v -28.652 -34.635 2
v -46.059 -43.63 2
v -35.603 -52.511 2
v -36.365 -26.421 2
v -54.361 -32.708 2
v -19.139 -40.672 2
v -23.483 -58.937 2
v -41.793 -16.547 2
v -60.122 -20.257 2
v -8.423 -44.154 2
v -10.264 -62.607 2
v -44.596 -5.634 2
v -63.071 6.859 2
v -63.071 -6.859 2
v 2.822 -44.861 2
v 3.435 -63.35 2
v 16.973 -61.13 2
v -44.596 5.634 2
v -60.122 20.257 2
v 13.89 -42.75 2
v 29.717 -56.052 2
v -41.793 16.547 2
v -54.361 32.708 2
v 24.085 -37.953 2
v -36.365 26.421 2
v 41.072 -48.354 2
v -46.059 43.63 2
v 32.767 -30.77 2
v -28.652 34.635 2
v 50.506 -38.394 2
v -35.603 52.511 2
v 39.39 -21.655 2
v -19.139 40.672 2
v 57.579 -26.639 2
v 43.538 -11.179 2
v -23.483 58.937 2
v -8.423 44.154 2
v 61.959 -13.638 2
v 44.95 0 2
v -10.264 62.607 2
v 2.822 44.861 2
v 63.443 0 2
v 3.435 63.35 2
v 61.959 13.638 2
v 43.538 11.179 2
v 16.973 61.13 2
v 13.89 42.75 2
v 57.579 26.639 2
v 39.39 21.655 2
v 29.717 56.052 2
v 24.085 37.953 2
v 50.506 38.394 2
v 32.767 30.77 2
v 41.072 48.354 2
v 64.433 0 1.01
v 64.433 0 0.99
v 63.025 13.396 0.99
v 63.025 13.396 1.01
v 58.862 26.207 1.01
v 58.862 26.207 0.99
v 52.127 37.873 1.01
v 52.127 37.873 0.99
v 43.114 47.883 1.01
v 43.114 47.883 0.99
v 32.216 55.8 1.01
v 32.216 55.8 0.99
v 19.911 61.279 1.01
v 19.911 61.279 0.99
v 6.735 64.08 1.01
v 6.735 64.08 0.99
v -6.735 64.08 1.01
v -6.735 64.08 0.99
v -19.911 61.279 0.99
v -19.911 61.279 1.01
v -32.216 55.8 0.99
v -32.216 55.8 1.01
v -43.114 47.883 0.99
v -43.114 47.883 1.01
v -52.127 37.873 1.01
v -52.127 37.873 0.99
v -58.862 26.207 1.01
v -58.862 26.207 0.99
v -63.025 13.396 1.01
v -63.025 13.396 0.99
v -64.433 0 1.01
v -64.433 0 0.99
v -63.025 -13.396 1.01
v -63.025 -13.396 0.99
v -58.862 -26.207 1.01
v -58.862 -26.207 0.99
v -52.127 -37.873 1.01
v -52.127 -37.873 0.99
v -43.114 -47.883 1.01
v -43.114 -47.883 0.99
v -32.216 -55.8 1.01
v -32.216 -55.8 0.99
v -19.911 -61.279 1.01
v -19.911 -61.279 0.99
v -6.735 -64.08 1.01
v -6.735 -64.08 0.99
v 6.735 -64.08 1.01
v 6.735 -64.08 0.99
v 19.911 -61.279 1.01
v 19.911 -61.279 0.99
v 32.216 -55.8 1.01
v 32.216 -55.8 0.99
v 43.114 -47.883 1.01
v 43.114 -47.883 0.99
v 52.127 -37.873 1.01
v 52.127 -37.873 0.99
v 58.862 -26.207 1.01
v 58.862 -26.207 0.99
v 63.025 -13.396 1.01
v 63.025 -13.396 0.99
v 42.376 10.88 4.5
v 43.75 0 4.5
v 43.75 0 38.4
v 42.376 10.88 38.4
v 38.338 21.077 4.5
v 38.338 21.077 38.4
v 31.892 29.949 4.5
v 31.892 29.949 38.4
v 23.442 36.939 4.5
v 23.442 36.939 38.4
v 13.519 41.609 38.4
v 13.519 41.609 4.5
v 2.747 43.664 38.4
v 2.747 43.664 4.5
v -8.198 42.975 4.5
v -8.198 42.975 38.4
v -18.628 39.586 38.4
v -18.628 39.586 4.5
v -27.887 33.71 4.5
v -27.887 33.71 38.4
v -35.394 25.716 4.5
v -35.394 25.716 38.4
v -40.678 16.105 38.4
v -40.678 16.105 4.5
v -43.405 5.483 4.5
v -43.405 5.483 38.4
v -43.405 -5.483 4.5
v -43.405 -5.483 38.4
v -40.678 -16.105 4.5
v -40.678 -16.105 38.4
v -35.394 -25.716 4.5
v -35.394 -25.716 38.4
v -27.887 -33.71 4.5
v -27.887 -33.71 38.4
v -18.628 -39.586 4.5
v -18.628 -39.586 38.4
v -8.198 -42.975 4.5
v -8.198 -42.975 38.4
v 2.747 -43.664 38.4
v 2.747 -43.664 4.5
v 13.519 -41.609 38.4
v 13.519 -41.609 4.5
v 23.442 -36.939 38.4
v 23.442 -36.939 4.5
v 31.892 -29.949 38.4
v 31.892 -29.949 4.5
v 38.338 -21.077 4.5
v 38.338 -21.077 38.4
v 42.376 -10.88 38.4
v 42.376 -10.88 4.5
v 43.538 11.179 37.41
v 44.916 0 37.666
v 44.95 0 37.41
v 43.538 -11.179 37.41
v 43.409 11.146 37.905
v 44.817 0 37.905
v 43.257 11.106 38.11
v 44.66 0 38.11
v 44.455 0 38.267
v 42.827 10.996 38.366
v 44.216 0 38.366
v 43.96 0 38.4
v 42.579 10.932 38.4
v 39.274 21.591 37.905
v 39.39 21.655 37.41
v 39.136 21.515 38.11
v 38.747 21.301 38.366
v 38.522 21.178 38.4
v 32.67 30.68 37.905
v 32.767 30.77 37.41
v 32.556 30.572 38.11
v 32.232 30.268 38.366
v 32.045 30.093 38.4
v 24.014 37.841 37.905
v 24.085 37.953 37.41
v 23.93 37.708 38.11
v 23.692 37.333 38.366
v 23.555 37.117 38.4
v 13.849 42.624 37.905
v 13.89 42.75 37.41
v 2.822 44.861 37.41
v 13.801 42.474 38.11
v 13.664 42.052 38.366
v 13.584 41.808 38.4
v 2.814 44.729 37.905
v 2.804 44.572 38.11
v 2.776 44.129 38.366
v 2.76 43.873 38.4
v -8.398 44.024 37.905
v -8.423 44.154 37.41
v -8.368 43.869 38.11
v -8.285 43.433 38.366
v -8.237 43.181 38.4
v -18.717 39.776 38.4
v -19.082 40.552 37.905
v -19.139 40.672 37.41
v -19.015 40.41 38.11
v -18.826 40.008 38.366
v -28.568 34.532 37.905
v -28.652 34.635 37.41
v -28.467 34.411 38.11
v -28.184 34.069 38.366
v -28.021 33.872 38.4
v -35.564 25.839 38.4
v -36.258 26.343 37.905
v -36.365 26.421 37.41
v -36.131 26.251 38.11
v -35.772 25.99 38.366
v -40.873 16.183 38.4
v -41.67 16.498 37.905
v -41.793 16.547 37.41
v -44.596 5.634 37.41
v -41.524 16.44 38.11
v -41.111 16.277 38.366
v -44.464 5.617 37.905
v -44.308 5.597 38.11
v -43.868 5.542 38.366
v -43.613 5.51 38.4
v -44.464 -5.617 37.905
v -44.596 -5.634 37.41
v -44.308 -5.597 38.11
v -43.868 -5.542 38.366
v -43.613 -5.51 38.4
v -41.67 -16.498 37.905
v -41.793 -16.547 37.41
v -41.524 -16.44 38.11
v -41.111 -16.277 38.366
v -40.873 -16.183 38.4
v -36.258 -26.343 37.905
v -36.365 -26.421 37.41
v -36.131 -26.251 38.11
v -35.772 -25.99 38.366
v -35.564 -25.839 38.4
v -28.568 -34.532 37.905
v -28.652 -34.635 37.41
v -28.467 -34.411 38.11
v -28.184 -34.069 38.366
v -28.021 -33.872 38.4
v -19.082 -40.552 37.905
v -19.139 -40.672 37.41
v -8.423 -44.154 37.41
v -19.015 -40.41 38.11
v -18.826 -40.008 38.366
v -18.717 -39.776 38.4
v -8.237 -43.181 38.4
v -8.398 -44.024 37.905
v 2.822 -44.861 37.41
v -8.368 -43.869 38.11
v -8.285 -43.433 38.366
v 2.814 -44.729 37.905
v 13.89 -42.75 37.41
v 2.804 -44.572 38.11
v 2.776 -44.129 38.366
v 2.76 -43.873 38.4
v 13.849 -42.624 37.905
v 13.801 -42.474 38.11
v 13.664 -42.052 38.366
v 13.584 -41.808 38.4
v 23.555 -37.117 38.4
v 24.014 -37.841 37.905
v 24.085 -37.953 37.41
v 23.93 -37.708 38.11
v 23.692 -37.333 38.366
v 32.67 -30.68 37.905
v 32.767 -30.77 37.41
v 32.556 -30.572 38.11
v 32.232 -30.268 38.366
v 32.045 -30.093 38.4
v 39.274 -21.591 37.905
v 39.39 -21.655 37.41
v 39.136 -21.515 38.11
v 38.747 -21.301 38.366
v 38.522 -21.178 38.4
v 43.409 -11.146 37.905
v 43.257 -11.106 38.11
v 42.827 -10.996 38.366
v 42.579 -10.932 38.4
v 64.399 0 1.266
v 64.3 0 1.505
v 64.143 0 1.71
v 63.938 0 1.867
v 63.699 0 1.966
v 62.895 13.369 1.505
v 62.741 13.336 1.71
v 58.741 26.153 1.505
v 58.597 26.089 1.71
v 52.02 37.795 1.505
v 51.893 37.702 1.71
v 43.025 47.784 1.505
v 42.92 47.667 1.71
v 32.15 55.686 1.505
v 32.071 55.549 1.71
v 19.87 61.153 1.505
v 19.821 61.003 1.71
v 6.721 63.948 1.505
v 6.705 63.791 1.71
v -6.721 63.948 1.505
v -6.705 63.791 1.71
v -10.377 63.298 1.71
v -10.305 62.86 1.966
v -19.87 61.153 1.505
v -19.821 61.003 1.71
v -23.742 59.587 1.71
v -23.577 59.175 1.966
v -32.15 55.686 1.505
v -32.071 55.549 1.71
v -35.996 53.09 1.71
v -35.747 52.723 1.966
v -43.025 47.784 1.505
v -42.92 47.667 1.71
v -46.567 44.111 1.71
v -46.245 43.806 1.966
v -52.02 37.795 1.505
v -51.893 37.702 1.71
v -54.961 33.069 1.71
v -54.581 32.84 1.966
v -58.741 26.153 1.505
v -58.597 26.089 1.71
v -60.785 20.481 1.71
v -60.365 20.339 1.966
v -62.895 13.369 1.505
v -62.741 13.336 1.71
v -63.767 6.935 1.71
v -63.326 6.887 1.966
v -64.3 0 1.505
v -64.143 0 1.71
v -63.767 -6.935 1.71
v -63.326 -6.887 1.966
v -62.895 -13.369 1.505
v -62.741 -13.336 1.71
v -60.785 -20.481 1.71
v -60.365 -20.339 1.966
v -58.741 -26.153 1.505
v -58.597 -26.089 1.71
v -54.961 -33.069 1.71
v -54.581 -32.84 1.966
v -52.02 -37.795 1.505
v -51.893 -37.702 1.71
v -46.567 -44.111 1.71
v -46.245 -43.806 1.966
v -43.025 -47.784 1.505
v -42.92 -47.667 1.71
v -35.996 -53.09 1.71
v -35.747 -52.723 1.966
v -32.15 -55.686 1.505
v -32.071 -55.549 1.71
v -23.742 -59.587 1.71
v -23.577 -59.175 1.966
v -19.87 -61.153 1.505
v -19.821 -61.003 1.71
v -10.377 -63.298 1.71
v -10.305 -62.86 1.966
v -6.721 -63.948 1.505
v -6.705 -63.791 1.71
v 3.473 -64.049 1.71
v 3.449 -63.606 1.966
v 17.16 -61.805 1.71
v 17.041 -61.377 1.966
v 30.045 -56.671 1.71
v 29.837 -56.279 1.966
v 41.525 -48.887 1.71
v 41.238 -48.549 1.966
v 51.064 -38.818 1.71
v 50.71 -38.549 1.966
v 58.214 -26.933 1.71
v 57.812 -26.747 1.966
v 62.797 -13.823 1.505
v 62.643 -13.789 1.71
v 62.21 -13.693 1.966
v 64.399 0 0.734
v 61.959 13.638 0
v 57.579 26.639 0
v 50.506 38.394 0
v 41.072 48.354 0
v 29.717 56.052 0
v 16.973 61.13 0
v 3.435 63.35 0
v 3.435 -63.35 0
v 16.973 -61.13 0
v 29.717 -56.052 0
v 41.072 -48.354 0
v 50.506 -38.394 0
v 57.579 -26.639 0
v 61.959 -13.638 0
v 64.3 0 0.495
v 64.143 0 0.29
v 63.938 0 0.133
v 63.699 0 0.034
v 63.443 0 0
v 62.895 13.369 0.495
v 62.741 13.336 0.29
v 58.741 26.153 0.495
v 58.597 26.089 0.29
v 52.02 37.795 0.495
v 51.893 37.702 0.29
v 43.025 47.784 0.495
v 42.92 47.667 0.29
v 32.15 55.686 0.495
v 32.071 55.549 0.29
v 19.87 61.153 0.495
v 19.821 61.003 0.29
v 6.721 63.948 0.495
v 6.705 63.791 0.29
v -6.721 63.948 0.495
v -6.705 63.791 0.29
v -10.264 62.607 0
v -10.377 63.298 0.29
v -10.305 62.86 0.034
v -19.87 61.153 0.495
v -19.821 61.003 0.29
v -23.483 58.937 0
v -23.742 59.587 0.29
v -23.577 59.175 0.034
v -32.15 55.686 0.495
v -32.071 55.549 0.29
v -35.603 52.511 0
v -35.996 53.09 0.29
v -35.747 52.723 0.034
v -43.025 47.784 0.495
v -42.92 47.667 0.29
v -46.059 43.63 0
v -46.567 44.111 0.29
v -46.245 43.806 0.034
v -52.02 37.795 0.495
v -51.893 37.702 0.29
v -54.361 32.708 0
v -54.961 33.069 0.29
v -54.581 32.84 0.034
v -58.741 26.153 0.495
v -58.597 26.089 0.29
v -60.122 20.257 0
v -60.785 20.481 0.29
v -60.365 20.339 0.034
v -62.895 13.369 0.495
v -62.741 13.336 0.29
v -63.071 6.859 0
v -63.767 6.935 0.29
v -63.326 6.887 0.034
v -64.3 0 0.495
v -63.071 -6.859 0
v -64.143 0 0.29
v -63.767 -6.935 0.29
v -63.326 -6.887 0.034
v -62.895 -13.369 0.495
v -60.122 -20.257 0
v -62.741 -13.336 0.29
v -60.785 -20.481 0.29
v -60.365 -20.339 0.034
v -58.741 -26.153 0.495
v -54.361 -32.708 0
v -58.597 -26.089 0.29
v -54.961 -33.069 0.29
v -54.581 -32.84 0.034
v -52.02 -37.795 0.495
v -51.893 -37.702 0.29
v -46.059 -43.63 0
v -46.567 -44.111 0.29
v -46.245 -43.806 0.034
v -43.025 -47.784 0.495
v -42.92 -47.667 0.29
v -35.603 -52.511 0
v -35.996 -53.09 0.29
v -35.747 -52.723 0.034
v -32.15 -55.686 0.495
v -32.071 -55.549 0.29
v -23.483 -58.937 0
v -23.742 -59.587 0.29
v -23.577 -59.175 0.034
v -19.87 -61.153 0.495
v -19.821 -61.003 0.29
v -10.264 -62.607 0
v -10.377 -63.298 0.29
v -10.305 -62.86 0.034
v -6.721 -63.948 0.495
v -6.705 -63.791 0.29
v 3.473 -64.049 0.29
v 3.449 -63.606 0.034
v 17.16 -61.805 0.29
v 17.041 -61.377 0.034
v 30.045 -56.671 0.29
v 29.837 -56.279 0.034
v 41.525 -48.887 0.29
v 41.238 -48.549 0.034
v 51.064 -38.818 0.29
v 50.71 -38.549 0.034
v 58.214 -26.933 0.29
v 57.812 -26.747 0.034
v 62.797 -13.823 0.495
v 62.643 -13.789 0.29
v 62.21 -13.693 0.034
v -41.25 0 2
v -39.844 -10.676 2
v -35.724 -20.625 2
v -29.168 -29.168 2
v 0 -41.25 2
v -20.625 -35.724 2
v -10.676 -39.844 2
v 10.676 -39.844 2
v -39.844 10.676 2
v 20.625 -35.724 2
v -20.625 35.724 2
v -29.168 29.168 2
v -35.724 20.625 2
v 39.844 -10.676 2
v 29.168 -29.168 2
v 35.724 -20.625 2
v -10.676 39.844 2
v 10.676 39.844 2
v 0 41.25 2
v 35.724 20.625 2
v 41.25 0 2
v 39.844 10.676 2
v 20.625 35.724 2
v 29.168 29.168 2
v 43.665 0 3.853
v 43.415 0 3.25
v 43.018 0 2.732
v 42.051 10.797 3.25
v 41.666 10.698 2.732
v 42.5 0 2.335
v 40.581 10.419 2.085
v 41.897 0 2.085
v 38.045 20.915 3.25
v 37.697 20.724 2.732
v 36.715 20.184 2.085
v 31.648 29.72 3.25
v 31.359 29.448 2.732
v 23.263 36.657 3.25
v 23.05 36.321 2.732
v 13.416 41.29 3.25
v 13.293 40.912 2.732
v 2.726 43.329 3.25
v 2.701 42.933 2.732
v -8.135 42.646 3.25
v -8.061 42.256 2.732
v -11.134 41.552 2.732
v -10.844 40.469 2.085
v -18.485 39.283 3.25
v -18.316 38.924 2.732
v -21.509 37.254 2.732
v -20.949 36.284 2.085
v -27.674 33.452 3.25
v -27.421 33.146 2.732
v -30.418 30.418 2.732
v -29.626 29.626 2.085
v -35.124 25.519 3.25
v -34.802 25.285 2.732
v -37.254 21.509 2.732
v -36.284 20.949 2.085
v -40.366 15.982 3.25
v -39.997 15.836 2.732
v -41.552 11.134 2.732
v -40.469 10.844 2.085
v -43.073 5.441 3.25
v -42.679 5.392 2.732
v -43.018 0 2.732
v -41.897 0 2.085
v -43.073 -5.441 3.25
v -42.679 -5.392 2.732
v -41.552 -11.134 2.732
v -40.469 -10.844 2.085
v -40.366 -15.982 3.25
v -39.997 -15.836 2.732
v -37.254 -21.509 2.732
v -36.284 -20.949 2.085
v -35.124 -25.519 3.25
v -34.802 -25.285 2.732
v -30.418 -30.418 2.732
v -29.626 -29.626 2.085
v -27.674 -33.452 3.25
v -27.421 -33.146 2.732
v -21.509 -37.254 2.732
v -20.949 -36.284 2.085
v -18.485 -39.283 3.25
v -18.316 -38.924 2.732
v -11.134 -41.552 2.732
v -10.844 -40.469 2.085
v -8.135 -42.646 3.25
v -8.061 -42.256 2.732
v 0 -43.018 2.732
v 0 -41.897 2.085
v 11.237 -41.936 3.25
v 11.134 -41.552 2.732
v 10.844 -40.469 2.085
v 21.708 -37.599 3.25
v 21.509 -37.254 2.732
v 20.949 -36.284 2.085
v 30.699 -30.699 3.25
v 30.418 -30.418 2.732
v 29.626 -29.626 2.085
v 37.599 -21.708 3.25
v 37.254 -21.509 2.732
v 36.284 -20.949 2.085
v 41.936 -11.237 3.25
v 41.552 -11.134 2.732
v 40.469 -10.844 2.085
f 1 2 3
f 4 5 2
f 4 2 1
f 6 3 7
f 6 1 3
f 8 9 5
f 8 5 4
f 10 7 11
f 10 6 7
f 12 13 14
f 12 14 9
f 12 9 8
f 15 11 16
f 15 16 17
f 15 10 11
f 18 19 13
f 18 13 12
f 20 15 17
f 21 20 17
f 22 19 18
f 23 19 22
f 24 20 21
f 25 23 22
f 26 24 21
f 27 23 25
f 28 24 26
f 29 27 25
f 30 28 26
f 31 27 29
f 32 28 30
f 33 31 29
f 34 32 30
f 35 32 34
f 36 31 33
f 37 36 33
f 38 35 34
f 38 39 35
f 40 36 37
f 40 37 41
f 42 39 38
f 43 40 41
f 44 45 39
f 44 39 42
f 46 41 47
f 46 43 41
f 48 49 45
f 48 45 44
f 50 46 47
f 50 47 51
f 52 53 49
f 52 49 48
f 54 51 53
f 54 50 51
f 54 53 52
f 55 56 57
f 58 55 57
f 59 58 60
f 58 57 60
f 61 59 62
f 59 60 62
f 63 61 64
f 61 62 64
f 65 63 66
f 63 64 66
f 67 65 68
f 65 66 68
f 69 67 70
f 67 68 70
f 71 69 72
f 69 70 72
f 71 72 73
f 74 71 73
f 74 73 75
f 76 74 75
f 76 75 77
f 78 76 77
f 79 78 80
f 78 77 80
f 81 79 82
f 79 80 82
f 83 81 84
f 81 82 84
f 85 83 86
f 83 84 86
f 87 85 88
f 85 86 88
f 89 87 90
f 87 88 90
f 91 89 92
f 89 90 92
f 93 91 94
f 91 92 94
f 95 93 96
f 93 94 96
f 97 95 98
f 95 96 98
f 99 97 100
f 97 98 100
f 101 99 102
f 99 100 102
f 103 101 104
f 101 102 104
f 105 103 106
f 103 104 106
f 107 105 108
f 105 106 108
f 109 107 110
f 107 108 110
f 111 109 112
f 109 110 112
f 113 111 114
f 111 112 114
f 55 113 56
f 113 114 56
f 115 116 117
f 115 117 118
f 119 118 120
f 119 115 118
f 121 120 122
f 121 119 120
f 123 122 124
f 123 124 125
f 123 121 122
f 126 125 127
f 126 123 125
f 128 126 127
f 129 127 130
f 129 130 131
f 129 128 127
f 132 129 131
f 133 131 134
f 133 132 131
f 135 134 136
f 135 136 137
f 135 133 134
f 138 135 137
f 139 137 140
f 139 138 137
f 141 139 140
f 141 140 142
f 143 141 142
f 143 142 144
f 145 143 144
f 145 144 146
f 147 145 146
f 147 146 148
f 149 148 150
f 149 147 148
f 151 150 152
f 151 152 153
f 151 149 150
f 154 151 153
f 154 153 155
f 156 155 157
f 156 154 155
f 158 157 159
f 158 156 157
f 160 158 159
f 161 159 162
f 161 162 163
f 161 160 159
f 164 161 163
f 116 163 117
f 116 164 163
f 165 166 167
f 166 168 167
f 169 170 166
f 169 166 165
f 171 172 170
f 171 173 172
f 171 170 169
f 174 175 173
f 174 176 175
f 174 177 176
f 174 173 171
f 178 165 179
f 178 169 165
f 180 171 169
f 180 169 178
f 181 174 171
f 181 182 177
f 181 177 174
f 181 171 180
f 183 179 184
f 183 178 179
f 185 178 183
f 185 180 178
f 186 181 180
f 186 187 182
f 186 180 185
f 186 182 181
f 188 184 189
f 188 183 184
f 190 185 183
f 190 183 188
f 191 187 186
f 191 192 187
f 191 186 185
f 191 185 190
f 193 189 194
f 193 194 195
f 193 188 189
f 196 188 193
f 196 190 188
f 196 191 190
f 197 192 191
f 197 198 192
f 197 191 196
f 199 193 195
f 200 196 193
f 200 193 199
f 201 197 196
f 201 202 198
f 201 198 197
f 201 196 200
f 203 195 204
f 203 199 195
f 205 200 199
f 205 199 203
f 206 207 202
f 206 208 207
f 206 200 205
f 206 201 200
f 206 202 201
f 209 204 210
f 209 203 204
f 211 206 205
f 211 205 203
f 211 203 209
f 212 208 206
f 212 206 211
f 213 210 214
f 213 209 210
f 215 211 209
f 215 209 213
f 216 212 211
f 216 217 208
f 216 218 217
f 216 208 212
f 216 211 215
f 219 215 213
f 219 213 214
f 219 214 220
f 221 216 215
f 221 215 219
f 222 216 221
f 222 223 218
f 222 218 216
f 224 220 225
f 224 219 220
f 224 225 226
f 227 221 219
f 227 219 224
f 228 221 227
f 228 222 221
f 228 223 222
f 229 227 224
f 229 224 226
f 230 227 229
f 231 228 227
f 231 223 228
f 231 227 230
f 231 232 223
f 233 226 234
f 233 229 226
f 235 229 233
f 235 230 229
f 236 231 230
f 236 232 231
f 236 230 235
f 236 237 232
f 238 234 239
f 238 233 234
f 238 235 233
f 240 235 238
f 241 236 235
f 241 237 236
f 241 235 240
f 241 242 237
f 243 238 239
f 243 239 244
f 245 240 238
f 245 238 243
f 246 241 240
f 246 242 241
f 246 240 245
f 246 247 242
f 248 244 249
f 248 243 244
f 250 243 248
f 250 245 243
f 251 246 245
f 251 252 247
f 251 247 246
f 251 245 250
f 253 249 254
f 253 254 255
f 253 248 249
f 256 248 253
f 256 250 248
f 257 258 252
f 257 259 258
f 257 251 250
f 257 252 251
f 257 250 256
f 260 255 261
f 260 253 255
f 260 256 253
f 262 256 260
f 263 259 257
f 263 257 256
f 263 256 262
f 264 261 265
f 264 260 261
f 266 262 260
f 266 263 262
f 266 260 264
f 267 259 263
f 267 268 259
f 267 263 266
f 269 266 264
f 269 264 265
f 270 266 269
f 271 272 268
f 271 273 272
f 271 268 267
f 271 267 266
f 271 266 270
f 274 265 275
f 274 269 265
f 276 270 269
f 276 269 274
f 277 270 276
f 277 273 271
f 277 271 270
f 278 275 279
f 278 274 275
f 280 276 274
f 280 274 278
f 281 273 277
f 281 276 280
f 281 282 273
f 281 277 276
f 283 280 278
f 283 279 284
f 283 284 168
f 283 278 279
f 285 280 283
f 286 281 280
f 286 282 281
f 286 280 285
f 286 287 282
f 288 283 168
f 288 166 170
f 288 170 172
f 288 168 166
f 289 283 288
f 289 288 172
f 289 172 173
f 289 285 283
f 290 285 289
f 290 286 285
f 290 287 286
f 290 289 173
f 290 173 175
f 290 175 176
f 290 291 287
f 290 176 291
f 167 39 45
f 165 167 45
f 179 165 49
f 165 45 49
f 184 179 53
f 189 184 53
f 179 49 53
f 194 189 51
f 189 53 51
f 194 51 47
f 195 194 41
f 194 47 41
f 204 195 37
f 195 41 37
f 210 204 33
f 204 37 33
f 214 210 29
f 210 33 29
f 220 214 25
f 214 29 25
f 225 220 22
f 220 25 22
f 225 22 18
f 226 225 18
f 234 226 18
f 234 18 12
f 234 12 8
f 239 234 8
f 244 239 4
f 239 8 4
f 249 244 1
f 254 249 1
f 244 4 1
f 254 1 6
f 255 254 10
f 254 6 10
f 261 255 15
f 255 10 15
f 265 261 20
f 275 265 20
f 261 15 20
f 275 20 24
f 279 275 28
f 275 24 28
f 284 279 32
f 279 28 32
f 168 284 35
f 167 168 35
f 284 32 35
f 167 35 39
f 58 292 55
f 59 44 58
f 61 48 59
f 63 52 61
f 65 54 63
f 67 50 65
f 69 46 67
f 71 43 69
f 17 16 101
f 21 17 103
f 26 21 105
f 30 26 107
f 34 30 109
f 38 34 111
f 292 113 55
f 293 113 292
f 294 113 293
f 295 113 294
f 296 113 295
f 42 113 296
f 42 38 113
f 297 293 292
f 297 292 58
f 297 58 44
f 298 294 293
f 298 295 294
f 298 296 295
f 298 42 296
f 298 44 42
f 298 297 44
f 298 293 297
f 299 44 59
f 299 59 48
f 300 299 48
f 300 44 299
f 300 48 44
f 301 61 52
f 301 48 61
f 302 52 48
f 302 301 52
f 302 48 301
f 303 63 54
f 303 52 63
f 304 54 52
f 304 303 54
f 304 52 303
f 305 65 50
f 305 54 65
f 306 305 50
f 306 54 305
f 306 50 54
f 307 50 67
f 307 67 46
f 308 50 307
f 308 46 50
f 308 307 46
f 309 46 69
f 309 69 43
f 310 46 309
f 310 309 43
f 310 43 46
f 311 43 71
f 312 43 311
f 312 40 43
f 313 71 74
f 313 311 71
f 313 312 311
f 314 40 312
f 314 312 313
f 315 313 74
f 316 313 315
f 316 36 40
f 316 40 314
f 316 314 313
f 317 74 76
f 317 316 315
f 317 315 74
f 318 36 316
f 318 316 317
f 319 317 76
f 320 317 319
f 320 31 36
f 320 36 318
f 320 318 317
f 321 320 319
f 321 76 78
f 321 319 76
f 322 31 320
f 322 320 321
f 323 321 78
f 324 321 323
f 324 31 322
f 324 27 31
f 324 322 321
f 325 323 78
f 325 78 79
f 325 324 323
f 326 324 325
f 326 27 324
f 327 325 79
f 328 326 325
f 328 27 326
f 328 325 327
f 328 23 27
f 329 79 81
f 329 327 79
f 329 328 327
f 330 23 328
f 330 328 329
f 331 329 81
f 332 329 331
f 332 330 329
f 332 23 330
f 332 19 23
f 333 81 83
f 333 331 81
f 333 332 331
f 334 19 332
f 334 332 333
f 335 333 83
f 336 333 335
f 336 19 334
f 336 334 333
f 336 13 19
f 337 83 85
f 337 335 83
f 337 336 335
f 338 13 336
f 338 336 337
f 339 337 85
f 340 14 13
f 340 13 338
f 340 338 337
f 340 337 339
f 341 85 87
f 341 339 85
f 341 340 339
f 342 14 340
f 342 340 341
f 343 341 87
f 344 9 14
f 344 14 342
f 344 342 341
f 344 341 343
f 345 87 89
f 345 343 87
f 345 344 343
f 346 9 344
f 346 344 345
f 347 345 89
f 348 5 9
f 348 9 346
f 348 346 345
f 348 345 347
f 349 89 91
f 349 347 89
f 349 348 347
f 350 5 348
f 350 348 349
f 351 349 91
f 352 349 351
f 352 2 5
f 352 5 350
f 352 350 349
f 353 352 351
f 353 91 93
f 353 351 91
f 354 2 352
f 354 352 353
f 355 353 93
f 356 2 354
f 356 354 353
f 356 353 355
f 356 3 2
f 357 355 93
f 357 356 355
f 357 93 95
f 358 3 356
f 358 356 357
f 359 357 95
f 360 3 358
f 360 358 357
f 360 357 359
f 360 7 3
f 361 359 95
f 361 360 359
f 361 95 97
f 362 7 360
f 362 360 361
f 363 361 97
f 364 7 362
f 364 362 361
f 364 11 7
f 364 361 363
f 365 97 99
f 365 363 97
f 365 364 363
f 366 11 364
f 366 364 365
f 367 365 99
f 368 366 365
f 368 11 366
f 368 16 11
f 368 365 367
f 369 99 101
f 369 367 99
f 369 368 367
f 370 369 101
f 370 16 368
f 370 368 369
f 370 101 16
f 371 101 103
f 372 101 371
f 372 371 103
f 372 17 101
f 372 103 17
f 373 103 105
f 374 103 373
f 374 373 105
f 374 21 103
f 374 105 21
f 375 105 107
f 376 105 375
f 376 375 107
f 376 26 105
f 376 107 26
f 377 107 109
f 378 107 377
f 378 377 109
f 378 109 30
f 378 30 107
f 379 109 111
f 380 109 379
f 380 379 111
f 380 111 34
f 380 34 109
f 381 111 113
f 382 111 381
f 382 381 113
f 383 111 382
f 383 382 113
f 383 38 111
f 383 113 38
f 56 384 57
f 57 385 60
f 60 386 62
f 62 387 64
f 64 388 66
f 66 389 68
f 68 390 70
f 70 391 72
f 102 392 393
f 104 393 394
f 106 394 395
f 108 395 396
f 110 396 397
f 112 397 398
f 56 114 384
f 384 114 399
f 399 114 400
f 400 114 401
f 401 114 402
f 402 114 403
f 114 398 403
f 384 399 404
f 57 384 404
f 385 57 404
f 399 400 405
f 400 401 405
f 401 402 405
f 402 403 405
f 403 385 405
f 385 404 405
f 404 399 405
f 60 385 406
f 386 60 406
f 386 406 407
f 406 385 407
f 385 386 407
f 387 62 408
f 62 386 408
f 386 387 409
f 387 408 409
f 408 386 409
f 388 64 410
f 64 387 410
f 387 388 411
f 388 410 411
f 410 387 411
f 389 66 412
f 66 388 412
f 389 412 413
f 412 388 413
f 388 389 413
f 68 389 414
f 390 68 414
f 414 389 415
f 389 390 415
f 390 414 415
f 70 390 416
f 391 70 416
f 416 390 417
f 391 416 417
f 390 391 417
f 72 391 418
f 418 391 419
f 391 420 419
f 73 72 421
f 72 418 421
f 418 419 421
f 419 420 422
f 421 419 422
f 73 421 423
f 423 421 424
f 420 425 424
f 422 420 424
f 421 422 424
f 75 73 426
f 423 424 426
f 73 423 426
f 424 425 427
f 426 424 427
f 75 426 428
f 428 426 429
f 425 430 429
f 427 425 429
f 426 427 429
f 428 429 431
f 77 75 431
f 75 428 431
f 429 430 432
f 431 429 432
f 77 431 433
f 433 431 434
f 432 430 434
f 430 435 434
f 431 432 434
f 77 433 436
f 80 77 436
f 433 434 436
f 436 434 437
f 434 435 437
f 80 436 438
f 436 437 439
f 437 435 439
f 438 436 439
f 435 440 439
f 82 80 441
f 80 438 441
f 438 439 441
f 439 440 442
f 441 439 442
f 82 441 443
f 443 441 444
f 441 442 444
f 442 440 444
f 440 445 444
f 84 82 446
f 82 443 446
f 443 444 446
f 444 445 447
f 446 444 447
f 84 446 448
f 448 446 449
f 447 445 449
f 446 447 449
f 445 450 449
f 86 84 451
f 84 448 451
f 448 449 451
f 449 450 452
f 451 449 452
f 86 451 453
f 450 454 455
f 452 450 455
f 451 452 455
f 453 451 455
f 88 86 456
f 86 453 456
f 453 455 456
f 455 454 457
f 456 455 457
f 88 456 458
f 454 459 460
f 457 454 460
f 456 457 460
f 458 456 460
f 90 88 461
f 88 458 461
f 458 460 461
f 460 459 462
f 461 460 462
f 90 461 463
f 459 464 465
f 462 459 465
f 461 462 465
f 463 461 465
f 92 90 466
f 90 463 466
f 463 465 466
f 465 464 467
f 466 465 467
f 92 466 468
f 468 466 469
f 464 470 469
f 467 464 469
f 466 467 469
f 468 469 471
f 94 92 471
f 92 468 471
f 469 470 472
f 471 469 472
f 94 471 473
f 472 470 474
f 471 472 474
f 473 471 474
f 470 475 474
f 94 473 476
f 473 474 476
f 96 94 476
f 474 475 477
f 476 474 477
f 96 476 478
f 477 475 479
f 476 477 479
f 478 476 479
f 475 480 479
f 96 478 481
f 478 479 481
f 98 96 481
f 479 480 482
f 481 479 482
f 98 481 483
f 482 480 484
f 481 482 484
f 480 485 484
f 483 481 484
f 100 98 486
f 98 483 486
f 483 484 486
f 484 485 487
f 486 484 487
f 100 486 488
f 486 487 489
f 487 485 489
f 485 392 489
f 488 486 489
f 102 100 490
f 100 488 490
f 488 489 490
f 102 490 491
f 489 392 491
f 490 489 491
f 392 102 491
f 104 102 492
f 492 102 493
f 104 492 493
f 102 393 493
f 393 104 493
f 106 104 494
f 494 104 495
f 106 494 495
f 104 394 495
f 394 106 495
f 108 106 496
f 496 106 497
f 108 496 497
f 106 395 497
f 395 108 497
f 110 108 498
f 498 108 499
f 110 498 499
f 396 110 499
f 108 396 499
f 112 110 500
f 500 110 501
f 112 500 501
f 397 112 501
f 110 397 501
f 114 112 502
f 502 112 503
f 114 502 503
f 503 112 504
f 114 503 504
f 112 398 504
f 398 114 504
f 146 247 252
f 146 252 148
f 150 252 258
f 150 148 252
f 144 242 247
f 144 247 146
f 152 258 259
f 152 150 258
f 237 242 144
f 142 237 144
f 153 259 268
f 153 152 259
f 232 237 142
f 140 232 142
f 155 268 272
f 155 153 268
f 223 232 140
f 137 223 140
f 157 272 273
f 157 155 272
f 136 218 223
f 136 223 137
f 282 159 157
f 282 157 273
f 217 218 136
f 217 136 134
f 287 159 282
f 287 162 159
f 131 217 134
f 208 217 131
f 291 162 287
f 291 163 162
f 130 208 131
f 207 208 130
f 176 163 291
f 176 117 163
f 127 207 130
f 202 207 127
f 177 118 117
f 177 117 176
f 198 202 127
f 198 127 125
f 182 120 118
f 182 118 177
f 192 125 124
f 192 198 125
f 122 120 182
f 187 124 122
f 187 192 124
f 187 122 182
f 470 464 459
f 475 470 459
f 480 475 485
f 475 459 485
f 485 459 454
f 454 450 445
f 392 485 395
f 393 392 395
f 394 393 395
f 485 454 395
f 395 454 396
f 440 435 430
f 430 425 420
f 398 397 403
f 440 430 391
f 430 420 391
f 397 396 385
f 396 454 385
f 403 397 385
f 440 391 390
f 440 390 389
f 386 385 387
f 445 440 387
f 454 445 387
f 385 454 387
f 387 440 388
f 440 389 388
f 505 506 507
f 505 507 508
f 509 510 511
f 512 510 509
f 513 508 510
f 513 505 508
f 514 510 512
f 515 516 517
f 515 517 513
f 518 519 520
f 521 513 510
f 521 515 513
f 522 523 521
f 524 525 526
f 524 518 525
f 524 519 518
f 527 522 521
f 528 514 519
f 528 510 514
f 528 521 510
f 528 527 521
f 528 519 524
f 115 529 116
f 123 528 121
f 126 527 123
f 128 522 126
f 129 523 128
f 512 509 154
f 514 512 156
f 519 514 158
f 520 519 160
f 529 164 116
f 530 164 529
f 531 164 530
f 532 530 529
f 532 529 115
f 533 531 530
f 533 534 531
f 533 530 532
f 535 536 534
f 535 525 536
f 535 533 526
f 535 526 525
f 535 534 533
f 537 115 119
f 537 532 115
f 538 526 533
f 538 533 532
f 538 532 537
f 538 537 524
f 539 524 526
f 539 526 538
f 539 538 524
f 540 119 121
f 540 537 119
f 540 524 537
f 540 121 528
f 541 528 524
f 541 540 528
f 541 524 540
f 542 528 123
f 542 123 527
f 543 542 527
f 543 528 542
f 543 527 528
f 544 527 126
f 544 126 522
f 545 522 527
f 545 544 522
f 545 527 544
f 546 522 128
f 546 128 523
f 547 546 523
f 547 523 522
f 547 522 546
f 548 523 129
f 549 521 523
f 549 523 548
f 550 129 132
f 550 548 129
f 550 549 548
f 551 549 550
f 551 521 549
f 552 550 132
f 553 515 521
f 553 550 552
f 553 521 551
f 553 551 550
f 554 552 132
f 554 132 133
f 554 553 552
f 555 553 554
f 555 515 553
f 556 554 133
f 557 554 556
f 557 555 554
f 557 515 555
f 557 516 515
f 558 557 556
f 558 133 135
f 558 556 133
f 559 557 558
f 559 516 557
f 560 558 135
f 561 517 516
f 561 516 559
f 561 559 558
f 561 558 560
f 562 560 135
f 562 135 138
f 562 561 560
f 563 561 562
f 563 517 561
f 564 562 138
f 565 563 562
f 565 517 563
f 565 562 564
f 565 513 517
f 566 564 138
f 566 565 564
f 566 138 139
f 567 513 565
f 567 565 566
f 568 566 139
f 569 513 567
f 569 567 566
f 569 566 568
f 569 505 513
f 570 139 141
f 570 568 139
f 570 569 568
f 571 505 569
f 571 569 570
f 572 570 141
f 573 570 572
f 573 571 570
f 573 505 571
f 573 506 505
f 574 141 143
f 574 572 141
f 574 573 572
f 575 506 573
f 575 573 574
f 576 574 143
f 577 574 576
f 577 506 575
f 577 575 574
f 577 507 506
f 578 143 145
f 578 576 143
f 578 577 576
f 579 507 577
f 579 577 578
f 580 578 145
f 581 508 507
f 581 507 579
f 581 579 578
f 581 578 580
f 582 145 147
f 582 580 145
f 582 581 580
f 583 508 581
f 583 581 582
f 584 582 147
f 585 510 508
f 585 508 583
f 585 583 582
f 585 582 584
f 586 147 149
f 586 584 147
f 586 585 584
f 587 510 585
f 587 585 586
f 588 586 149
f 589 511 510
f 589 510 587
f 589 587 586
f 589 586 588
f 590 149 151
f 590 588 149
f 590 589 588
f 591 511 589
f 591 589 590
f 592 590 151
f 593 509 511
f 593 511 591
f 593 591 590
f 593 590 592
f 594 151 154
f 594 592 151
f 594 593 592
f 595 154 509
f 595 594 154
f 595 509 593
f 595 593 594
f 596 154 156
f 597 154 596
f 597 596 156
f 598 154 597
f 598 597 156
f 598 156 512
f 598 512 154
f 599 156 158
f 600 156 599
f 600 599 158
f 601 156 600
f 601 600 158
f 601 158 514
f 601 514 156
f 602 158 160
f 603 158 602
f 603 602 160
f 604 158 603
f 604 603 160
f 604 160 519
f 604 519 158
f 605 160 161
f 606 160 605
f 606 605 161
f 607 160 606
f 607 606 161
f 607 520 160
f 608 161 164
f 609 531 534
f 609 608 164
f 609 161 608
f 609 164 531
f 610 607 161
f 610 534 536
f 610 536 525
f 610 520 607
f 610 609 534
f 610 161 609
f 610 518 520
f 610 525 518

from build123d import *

# Parameters (mm, degrees)
SKETCH032_R   = 64.432756
PAD008_DEPTH  = 2
SKETCH033_R   = 44.95
SKETCH033_R_2 = 43.75
PAD009_DEPTH  = 36.4
FILLET009_R   = 0.99
FILLET010_R   = 2.5


with BuildPart() as part:
    # Sketch032 → Pad008 (new body)
    with BuildSketch(Plane.XY):
        Circle(SKETCH032_R)
    extrude(amount=PAD008_DEPTH)

    # Sketch033 → Pad009 (join)
    with BuildSketch(Plane.XY.offset(2)):
        Circle(SKETCH033_R)
        Circle(SKETCH033_R_2, mode=Mode.SUBTRACT)
    extrude(amount=PAD009_DEPTH)

    # Fillet009
    fillet009_edges = [part.edges().sort_by_distance(p)[0] for p in [
        (-44.95, 0, 38.4),
        (-64.432756, 0, 2),
        (-64.432756, 0, 0),
    ]]
    fillet(fillet009_edges, radius=FILLET009_R)

    # Fillet010
    fillet010_edges = [part.edges().sort_by_distance(p)[0] for p in [
        (-43.75, 0, 2),
    ]]
    fillet(fillet010_edges, radius=FILLET010_R)


solid = part.part
